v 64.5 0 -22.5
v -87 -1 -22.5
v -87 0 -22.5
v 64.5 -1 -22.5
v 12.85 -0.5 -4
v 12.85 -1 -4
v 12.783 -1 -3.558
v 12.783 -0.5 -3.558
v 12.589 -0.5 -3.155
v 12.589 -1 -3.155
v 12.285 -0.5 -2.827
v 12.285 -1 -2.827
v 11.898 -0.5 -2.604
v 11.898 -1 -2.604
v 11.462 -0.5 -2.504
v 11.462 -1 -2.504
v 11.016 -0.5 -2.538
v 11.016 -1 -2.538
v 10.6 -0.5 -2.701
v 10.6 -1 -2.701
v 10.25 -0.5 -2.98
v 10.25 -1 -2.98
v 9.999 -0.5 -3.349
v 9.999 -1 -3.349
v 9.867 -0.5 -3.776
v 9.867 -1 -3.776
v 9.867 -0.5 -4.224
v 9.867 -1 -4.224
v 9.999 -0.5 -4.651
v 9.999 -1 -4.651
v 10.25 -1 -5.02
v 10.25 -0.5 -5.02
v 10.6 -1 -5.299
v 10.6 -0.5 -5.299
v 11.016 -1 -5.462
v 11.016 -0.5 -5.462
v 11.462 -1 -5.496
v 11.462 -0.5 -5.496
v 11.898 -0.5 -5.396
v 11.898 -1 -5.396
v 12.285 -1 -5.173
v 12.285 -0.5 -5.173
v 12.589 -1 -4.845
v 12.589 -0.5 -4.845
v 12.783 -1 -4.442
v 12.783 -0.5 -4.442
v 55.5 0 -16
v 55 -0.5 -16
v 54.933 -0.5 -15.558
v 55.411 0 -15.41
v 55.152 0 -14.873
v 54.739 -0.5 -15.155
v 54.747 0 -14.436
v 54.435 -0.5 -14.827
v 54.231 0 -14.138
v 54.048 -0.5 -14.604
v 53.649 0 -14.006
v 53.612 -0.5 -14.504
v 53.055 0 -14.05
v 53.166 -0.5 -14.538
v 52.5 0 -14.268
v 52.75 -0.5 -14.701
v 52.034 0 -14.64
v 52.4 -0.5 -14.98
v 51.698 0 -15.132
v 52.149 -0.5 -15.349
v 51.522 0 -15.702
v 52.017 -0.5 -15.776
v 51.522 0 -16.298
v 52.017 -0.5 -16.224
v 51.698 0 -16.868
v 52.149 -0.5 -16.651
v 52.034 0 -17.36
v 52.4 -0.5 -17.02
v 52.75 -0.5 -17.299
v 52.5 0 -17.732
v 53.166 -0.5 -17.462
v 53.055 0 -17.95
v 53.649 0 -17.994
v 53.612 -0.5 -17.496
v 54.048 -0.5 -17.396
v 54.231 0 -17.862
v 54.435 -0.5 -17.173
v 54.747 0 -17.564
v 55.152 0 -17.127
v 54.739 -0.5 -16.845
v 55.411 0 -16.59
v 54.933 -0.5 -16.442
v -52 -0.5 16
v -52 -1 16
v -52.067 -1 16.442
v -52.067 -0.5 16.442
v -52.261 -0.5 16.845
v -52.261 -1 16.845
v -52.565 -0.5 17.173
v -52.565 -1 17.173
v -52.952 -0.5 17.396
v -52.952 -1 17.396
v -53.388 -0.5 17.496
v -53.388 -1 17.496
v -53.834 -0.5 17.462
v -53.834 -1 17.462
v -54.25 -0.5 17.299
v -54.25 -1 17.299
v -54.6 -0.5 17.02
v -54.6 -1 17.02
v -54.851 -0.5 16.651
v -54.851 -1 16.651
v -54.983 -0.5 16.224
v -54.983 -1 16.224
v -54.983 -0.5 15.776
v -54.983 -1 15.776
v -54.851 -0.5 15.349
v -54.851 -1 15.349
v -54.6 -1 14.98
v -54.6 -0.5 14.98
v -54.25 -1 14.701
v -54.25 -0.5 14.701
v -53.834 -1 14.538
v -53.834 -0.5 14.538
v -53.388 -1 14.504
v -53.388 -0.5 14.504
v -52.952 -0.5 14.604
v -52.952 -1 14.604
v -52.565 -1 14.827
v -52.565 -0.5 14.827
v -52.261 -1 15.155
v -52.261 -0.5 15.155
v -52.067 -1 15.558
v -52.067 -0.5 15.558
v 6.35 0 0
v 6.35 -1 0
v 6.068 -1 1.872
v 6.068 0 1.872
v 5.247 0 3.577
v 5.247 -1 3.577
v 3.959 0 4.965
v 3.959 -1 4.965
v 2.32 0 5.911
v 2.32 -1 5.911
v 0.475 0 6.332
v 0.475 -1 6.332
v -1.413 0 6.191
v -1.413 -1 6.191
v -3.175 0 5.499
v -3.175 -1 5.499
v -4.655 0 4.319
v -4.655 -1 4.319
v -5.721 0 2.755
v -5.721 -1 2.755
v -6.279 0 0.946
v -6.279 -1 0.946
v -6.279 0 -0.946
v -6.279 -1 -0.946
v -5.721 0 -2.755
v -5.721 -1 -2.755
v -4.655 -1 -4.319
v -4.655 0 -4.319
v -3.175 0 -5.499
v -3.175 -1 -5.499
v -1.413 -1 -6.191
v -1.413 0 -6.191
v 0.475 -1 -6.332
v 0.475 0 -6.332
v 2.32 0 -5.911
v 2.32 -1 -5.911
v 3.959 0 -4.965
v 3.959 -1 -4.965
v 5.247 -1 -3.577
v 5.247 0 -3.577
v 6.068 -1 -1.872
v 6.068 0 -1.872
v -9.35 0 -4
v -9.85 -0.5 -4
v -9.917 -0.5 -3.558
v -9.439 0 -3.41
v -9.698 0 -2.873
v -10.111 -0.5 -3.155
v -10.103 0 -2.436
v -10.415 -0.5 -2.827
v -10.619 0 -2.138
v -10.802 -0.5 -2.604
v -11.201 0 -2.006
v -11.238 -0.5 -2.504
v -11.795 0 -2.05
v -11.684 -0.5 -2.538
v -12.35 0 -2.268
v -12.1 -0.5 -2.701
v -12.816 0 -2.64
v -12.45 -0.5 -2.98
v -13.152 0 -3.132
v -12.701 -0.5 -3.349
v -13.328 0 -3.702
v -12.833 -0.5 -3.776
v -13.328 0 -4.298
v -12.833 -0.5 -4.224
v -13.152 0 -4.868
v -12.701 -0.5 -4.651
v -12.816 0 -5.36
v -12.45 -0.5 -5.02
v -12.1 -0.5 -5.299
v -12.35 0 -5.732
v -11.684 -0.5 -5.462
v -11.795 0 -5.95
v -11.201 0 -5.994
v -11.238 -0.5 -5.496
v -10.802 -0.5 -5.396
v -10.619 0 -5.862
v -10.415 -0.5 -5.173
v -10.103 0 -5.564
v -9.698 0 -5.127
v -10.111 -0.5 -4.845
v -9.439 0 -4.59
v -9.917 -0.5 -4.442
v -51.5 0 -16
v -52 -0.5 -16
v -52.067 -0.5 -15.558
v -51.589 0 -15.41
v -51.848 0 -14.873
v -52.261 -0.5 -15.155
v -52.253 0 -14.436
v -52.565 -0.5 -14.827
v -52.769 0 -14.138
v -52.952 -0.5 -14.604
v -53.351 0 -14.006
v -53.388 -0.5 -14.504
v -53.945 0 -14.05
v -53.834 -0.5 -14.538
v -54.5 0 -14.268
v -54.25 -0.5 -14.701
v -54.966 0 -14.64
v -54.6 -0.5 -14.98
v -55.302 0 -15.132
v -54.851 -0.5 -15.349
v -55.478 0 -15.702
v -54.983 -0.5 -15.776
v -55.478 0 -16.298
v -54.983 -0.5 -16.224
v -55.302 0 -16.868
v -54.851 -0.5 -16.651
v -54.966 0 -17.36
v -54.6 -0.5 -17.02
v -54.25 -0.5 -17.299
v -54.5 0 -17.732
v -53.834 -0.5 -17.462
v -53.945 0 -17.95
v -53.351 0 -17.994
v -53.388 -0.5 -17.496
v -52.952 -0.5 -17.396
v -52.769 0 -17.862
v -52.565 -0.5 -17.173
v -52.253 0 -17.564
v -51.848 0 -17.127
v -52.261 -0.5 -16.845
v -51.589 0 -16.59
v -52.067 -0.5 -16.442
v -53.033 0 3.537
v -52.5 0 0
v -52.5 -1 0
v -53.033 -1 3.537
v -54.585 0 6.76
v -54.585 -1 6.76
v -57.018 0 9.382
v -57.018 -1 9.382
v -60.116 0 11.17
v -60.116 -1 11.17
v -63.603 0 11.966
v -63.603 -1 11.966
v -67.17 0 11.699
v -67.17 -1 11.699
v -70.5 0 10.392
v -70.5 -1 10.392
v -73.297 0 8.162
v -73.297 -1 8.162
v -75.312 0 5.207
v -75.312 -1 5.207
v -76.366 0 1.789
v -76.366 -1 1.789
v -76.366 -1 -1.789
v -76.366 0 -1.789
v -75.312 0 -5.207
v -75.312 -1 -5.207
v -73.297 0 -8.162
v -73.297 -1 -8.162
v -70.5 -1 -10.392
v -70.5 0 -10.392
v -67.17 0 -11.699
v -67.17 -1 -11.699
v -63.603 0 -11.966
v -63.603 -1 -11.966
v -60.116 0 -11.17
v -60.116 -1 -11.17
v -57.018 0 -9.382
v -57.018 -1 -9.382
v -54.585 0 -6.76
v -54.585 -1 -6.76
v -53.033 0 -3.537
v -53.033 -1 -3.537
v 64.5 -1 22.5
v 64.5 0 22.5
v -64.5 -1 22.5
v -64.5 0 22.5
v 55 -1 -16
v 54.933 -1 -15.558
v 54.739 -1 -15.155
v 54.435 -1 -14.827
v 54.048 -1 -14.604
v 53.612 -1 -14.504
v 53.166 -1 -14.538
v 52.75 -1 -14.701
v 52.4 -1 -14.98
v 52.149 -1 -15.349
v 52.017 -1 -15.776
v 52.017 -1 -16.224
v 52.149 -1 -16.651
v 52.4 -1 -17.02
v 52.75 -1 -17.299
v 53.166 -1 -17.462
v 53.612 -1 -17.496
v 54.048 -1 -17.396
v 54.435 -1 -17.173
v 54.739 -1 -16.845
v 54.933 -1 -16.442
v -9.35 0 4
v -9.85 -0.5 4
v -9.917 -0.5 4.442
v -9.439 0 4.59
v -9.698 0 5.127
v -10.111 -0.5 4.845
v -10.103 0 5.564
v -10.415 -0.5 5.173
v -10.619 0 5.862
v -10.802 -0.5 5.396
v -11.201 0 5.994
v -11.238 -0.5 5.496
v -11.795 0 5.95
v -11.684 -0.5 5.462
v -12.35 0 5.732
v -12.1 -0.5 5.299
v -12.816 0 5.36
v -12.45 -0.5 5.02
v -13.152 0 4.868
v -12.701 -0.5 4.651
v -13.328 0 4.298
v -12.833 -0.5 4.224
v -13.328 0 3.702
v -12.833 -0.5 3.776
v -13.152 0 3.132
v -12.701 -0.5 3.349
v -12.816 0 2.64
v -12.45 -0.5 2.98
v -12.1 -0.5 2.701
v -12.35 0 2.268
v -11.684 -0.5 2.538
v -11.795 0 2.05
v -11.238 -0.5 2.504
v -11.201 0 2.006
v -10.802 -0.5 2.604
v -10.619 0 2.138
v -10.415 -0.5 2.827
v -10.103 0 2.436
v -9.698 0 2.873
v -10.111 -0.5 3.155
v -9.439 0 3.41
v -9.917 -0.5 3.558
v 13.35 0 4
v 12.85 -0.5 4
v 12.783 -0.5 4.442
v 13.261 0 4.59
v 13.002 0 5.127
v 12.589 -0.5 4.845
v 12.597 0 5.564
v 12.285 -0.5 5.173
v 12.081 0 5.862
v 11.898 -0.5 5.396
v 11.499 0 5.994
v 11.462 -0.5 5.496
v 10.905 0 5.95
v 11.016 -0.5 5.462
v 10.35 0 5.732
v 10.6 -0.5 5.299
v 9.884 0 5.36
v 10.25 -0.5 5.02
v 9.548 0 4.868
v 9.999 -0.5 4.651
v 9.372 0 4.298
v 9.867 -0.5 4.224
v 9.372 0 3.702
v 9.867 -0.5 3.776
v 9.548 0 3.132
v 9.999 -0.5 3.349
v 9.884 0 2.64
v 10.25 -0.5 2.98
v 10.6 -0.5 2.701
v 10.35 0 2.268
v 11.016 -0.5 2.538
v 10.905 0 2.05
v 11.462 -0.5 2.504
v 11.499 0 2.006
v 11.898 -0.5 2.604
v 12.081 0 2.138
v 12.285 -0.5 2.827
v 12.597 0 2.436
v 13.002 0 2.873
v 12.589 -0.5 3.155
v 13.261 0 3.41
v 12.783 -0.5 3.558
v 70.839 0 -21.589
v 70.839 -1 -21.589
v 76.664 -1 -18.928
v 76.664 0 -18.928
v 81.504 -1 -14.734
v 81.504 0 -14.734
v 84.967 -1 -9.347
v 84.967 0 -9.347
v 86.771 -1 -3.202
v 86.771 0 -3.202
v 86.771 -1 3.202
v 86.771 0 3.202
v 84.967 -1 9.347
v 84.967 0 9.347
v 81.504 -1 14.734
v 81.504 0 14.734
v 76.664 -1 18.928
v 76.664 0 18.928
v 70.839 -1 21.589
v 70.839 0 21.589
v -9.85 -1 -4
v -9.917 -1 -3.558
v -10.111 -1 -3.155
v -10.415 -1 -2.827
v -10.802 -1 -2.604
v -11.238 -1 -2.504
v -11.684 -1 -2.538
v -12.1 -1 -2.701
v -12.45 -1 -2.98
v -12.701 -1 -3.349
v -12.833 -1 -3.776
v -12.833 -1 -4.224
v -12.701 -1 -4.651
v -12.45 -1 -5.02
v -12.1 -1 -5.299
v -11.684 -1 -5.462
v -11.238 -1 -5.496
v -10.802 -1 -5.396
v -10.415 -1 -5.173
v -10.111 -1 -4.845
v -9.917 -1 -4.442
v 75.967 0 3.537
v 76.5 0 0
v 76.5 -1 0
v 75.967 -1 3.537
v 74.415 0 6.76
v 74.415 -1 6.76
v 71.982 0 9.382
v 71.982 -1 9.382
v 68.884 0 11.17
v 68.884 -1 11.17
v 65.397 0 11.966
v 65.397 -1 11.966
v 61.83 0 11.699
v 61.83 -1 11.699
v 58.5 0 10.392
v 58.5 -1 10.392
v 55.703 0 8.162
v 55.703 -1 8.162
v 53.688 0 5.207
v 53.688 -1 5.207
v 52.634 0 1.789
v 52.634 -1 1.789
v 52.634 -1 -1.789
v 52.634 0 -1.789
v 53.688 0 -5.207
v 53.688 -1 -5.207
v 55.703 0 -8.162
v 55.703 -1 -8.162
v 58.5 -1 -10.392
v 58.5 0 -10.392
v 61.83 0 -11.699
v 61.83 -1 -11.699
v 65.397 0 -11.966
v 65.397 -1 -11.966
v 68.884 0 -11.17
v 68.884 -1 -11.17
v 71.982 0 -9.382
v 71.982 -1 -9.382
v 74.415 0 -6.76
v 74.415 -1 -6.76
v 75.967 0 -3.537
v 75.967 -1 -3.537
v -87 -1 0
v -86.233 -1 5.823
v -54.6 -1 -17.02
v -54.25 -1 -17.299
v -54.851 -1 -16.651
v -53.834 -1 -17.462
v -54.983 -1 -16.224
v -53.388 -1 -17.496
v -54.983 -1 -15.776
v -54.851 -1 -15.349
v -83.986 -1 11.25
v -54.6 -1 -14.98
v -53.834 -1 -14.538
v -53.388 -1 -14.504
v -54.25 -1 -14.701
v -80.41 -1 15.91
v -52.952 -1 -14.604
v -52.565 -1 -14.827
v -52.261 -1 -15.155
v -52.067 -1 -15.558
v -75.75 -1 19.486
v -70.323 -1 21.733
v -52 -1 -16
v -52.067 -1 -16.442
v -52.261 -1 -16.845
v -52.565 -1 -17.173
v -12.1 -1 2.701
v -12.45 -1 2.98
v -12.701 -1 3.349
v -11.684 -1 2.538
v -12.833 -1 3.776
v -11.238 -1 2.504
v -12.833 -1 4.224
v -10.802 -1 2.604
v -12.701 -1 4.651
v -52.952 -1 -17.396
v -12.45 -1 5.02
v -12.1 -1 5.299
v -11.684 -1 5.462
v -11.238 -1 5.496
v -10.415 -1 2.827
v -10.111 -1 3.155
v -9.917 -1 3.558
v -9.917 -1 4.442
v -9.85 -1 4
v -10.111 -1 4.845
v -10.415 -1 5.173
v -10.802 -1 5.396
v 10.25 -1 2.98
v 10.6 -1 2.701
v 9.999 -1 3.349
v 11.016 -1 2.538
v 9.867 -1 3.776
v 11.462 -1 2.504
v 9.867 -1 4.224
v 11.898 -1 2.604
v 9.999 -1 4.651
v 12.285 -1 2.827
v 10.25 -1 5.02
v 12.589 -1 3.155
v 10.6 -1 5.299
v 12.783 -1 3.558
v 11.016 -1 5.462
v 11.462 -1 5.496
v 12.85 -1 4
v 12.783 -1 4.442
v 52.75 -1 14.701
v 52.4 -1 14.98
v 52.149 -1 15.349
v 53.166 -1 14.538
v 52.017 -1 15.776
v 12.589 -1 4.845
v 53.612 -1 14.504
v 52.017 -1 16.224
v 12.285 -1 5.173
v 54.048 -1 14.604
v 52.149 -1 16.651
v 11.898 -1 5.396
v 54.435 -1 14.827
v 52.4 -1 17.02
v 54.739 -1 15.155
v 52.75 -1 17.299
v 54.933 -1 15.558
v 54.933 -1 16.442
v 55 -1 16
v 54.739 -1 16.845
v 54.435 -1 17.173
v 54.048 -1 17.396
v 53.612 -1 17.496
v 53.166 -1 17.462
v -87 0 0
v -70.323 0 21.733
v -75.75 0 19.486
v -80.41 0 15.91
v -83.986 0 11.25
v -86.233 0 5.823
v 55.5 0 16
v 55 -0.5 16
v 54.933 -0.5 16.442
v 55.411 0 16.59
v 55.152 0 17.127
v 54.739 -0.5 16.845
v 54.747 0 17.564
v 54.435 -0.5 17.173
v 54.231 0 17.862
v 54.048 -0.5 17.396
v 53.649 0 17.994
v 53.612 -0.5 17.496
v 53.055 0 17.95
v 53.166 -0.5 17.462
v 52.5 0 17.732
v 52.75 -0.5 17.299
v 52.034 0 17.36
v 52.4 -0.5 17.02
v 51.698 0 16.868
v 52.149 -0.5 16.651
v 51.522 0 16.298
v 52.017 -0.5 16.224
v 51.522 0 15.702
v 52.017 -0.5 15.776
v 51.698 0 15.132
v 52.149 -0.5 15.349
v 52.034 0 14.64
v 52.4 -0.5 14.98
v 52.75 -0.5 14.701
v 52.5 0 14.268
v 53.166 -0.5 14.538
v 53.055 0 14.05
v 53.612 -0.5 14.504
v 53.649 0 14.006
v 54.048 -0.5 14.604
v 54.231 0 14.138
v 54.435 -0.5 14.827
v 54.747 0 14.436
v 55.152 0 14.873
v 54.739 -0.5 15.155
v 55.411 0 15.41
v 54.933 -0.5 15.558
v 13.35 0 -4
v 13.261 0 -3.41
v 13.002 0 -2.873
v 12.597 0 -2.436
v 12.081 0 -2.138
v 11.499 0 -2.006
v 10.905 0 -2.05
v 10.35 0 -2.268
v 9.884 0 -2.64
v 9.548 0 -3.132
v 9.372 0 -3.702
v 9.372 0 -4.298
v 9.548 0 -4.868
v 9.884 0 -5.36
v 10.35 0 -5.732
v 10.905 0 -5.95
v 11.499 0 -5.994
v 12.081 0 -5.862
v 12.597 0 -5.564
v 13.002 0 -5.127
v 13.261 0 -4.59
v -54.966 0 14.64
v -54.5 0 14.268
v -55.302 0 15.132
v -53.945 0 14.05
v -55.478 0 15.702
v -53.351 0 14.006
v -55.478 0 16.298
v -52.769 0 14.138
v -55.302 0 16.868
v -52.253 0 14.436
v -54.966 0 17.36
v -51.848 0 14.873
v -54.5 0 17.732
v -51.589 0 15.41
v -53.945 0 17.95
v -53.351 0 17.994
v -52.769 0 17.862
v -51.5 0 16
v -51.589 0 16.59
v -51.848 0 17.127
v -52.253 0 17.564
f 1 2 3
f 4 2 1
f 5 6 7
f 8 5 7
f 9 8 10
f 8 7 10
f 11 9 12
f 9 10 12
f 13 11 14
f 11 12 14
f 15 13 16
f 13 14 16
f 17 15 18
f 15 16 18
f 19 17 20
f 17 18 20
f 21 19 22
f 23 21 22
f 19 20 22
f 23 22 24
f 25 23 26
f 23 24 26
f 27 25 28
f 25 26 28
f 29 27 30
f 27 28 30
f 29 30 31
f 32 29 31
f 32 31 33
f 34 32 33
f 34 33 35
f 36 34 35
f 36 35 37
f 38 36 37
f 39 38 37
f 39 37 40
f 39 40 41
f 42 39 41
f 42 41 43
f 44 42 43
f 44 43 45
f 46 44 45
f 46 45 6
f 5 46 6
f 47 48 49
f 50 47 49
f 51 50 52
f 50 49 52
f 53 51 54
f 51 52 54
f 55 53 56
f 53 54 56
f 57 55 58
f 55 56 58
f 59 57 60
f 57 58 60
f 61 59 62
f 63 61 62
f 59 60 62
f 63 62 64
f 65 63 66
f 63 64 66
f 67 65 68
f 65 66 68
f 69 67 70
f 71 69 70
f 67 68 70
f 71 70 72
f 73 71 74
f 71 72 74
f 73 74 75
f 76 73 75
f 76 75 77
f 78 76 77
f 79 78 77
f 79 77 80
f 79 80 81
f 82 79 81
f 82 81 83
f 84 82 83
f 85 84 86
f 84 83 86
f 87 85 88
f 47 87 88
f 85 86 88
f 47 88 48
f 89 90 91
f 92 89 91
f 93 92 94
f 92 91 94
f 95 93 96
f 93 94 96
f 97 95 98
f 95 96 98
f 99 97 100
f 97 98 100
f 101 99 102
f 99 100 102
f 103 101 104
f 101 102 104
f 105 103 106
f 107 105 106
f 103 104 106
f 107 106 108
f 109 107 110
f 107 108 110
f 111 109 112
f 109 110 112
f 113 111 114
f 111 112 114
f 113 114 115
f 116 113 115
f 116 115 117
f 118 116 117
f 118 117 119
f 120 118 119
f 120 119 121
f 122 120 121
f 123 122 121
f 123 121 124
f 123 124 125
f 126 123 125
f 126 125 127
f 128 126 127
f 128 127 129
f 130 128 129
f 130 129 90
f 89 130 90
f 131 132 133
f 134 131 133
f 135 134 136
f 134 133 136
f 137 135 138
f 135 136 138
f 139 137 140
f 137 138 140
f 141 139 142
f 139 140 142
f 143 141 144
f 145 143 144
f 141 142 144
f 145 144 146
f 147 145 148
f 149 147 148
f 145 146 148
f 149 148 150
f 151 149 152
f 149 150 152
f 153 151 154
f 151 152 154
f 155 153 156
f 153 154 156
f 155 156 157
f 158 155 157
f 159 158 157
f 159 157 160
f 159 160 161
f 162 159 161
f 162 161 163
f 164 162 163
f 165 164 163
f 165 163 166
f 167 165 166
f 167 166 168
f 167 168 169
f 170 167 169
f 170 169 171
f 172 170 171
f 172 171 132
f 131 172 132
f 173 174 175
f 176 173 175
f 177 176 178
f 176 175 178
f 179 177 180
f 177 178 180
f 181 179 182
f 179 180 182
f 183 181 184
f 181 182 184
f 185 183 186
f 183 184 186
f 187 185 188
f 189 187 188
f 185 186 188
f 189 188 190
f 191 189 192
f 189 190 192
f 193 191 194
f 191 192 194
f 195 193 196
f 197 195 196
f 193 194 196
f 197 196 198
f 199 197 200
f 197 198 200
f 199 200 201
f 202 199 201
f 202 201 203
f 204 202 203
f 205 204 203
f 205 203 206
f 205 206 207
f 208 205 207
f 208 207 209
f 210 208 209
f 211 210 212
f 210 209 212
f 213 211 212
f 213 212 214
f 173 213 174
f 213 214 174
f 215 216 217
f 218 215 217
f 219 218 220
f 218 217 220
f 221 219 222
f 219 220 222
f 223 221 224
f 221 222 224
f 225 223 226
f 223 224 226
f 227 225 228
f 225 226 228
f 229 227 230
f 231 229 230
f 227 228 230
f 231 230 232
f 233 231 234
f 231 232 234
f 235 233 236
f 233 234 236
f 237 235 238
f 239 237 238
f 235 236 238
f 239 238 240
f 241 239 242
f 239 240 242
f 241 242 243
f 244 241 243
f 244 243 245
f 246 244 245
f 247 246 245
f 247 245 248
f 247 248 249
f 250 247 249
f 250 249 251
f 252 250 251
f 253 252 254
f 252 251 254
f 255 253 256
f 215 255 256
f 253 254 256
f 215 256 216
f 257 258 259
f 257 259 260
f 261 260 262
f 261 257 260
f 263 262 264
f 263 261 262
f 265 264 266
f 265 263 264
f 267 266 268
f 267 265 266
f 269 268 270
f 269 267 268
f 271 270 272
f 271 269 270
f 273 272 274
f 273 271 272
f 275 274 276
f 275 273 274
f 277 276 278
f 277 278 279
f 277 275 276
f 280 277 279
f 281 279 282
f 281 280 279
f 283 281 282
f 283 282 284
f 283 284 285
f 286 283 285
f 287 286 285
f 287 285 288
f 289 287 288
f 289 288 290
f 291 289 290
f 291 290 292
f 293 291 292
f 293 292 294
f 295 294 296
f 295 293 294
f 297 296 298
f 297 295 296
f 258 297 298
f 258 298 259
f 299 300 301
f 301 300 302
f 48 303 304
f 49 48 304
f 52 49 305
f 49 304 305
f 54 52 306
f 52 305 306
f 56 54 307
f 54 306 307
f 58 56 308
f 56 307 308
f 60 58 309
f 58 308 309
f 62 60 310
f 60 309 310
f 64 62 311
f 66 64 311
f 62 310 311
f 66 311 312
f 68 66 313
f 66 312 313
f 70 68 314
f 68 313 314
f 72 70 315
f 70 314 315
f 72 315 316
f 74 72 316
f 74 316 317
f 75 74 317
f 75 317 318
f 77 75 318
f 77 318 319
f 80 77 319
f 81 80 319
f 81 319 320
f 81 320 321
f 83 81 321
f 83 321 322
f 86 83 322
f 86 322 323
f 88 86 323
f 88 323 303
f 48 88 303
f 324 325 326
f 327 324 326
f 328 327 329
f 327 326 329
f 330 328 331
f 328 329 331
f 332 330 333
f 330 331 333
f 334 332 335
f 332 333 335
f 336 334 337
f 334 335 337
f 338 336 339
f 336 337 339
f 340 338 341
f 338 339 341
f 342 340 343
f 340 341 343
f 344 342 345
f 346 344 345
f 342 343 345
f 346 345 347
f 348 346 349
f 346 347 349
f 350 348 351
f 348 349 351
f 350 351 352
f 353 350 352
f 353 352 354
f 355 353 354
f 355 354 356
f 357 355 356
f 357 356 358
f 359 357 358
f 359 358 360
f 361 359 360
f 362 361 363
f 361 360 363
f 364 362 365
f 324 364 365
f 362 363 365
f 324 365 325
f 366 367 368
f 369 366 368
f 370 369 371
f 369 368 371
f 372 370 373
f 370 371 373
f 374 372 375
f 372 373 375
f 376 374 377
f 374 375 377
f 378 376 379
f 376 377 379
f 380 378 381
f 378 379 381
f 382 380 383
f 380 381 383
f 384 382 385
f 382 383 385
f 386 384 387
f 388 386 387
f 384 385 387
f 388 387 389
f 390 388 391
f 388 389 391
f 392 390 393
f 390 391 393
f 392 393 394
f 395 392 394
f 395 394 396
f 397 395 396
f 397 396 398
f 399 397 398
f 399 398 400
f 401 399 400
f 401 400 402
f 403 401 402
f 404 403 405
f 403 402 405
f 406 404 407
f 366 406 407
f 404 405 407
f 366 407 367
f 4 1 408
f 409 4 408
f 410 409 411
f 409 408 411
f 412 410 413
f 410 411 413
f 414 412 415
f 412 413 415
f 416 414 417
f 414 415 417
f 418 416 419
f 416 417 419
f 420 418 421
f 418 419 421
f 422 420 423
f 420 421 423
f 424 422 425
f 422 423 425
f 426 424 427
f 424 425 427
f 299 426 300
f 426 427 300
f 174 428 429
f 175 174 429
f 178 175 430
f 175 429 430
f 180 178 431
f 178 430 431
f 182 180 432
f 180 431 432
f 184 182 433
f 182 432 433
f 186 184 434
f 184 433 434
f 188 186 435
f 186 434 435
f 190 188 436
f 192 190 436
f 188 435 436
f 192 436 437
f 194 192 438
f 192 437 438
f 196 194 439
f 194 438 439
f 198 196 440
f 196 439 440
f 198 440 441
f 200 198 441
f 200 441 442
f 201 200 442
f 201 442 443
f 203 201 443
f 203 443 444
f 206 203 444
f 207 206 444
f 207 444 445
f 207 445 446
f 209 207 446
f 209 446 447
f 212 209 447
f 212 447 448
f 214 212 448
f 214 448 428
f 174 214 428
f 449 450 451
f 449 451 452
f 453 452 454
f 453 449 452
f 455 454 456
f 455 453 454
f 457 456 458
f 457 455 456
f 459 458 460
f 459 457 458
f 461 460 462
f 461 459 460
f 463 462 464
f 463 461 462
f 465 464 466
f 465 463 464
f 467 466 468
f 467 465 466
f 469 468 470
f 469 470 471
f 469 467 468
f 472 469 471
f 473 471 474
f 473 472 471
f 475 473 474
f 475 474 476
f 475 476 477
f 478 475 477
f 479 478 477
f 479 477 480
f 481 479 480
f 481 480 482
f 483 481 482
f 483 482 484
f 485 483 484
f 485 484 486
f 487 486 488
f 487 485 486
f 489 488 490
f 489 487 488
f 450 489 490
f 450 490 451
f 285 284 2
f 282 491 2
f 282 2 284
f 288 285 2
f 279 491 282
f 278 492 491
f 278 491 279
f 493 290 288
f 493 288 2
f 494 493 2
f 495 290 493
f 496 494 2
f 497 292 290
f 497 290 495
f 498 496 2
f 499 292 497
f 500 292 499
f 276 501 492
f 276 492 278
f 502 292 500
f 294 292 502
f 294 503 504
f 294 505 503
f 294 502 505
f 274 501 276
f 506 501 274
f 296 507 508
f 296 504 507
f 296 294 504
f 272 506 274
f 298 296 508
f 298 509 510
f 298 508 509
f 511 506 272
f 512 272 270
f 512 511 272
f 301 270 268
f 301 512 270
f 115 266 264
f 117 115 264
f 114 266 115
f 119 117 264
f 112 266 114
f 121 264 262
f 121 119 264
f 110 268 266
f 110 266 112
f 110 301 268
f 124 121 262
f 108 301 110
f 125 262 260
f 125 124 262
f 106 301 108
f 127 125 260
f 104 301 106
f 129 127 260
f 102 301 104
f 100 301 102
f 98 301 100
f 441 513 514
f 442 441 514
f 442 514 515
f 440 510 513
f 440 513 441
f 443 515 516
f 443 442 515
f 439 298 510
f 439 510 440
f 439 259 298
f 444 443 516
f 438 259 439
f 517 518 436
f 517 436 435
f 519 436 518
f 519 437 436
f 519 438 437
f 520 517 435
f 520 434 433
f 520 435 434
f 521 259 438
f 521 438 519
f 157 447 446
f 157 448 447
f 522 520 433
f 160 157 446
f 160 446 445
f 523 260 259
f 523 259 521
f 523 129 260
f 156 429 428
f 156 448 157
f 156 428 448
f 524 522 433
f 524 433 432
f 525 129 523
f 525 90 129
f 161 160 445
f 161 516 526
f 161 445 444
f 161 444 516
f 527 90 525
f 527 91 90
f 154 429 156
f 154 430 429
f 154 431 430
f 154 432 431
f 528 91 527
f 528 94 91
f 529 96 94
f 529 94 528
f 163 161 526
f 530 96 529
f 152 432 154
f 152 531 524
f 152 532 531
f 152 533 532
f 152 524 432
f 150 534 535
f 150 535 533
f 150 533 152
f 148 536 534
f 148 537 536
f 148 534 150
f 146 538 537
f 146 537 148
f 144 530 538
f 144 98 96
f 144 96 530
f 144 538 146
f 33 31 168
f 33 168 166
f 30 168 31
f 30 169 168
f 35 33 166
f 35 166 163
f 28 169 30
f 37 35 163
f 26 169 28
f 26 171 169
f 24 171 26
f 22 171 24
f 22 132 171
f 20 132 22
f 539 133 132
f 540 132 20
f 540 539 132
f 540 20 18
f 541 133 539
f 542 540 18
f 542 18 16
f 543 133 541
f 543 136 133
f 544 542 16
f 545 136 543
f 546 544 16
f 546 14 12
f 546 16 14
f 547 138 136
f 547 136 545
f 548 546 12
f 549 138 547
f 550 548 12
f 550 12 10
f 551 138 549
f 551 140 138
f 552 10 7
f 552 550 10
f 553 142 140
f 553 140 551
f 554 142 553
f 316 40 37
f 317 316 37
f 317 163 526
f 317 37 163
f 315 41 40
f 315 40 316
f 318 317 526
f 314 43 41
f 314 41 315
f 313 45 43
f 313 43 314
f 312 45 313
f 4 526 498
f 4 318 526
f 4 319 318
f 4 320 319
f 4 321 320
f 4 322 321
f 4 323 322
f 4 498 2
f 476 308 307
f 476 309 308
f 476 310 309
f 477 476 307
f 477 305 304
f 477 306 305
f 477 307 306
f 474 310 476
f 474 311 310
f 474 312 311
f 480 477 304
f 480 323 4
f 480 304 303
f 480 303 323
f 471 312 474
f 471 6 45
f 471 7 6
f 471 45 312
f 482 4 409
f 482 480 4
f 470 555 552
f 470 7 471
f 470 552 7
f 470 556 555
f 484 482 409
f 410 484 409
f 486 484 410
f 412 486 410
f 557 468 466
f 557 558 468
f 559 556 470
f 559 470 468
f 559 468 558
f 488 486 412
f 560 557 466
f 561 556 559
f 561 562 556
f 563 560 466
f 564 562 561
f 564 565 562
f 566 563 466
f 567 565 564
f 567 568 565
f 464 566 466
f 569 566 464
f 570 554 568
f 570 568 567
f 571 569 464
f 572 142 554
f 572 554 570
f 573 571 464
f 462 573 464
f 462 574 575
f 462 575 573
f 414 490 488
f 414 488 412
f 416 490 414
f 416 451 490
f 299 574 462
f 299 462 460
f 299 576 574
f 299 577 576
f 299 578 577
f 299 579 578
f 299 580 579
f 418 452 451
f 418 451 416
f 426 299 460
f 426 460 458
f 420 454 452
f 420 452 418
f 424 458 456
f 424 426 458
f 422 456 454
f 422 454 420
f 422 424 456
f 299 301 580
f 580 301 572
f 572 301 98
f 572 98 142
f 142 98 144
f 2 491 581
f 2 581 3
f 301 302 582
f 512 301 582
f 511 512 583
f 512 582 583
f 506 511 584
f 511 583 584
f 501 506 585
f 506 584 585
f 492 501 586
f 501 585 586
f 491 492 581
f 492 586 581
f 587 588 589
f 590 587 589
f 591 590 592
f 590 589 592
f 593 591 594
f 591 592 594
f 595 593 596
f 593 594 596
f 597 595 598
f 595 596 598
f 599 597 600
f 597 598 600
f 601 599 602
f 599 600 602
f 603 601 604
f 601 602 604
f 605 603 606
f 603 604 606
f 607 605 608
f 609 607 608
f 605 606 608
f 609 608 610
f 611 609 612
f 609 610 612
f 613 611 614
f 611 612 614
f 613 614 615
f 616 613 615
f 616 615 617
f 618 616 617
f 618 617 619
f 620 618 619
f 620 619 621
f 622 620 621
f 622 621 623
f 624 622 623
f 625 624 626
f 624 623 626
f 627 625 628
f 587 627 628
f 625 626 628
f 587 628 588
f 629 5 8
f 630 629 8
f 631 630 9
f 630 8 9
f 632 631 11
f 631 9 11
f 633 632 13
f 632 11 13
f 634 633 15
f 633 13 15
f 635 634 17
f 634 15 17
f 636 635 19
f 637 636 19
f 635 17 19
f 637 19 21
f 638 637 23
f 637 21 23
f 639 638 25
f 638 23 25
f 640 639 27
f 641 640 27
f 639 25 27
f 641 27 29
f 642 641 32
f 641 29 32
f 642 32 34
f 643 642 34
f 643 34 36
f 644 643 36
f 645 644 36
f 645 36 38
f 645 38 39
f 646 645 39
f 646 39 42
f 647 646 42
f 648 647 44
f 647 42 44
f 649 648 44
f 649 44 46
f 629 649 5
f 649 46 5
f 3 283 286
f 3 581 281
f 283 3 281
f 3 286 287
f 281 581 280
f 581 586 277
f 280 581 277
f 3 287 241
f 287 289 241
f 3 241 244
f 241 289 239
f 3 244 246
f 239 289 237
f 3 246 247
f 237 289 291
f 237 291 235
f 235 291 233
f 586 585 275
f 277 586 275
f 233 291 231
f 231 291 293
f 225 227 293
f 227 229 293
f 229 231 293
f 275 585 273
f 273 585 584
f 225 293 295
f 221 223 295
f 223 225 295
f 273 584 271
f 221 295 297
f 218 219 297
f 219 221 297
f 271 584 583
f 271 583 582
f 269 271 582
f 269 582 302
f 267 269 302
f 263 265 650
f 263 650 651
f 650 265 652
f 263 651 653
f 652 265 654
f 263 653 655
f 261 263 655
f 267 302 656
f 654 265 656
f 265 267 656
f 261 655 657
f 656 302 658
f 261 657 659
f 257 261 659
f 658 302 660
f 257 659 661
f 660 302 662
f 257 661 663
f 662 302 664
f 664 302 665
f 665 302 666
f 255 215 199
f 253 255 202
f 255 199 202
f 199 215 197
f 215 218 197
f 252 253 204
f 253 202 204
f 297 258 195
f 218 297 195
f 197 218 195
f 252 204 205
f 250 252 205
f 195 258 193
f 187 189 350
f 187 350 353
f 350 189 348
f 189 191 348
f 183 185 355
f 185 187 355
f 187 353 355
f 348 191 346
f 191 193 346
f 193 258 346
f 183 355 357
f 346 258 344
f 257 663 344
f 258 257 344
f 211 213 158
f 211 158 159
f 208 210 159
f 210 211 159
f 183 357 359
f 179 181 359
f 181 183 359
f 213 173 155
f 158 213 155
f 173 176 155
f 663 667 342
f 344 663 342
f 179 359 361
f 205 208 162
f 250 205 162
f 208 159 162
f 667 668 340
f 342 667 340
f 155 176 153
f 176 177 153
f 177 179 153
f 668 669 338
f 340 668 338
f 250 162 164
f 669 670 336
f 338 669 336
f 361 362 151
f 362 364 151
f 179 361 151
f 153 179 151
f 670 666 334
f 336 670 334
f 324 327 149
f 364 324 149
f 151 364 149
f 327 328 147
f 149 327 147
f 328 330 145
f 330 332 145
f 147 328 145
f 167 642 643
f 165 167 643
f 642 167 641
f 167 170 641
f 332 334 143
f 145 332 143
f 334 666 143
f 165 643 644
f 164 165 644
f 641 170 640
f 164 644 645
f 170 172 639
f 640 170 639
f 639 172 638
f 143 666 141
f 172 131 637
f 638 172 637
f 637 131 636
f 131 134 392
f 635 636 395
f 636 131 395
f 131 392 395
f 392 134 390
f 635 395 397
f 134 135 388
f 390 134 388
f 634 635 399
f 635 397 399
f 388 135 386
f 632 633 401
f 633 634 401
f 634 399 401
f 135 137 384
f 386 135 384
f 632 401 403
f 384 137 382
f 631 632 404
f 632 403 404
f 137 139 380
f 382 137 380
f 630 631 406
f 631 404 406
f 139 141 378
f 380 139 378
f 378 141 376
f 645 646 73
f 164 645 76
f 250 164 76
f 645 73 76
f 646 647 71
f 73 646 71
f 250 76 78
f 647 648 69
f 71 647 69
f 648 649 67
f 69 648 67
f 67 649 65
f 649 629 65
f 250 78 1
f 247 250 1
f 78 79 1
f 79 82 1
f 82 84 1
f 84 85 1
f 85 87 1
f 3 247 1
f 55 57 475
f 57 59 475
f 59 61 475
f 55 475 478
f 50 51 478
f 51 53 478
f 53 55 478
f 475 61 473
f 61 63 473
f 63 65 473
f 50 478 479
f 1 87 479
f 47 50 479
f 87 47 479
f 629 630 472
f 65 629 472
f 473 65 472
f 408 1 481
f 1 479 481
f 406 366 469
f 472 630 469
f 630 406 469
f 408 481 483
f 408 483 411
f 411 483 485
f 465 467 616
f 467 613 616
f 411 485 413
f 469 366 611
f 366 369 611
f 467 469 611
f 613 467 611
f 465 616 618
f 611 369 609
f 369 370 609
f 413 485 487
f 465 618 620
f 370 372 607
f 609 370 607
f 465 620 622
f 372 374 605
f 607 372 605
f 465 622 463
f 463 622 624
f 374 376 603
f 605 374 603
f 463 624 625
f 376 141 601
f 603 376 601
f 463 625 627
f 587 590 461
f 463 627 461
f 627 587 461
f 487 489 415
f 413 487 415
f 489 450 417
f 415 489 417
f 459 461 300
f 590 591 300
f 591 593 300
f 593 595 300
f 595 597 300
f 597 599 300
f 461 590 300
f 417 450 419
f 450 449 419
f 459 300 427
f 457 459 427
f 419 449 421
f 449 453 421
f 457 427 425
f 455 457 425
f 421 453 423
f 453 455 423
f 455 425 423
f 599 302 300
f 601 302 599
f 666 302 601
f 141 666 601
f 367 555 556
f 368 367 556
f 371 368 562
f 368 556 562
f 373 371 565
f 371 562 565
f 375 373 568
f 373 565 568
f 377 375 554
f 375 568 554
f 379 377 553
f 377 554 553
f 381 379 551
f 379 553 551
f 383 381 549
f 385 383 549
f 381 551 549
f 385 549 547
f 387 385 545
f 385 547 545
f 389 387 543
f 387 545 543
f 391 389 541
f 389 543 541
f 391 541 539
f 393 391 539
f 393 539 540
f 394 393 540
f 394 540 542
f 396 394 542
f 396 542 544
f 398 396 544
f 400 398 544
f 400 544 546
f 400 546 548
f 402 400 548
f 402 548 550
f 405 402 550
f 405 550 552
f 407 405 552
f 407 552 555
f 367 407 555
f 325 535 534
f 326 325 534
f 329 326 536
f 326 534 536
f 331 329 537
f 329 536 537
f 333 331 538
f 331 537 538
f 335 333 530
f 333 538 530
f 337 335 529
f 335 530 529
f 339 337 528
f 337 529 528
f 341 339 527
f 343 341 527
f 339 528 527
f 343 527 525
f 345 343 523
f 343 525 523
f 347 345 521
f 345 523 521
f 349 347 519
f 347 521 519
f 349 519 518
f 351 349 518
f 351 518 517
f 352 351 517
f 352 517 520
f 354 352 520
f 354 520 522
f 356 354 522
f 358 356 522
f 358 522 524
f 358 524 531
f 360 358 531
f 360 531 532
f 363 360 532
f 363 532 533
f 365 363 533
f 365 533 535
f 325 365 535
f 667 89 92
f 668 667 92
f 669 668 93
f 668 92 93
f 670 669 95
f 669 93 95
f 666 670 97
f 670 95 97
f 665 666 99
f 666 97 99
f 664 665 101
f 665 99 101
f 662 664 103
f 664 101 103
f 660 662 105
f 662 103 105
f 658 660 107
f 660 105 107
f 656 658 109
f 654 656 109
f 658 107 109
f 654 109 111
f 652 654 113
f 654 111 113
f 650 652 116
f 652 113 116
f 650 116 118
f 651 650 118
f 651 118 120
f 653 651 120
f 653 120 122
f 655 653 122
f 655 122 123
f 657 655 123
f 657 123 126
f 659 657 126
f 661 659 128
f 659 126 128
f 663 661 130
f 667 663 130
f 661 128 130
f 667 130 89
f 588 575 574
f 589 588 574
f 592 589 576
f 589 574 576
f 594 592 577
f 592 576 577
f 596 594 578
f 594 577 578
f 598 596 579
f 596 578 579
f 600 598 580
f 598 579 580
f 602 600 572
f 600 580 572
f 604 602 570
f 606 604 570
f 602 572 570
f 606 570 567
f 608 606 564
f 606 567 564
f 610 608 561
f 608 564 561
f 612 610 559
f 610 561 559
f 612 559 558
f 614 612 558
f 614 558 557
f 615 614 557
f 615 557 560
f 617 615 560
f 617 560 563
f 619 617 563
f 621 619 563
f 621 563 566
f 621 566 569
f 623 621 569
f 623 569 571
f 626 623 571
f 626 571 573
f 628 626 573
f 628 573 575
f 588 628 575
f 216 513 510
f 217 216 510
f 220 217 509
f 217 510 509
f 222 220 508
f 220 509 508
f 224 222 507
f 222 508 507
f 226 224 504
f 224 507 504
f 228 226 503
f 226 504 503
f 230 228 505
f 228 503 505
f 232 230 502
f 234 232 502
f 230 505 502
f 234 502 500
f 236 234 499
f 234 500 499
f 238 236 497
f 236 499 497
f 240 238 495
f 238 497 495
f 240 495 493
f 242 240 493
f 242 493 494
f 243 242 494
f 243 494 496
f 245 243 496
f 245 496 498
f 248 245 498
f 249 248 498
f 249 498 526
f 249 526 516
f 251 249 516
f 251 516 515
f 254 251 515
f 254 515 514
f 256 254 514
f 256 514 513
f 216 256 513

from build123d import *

# Parameters (mm, degrees)
F0_R      = 12
F1_DEPTH  = 1
F3_DEPTH  = 1
F4_R      = 1.5
F5_DEPTH  = 25
F6_SIZE   = 0.5
F7_R      = 6.35
F8_DEPTH  = 25
F9_R      = 1.5
F10_DEPTH = 25
F11_SIZE  = 0.5


with BuildPart() as f1:
    # F0 (on Front) → F1 (new body)
    with BuildSketch(Plane.XZ):
        with BuildLine():
            ThreePointArc((64.5, -22.5), (87, 0), (64.5, 22.5))
            Line((64.5, 22.5), (-64.5, 22.5))
            ThreePointArc((-64.5, 22.5), (-87, 0), (-64.5, -22.5))
            Line((-64.5, -22.5), (64.5, -22.5))
        make_face()
        with Locations((-64.5, 0)):
            Circle(F0_R, mode=Mode.SUBTRACT)
        with Locations((64.5, 0)):
            Circle(F0_R, mode=Mode.SUBTRACT)
    extrude(amount=F1_DEPTH)

    # F2 (on face) → F3 (join)
    with BuildSketch(Plane.XZ.offset(1)):
        Polygon((-87, -22.5), (-64.5, -22.5), (-64.5, -17.4313578755), (-70.5482587218, -14.7617282346), (-78.2682448626, -9.4630774111), (-80.8771923184, 0), (-87, 0), align=None)
    extrude(amount=-F3_DEPTH)

    # F4 (on face) → F5 (cut)
    with BuildSketch(Plane.XZ.offset(1)):
        with Locations((-53.5, 16)):
            Circle(F4_R)
        with Locations((-53.5, -16)):
            Circle(F4_R)
        with Locations((53.5, 16)):
            Circle(F4_R)
        with Locations((53.5, -16)):
            Circle(F4_R)
    extrude(amount=-F5_DEPTH, mode=Mode.SUBTRACT)

    # F6
    f6_edges = [f1.edges().sort_by_distance(p)[0] for p in [
        (-55, 0, 16),
        (-55, 0, -16),
        (52, 0, 16),
        (52, 0, -16),
    ]]
    chamfer(f6_edges, length=F6_SIZE)

    # F7 (on face) → F8 (cut)
    with BuildSketch(Plane.XZ.offset(1)):
        Circle(F7_R)
    extrude(amount=-F8_DEPTH, mode=Mode.SUBTRACT)

    # F9 (on face) → F10 (cut)
    with BuildSketch(Plane.XZ.offset(1)):
        with Locations((-11.35, 4)):
            Circle(F9_R)
        with Locations((-11.35, -4)):
            Circle(F9_R)
        with Locations((11.35, 4)):
            Circle(F9_R)
        with Locations((11.35, -4)):
            Circle(F9_R)
    extrude(amount=-F10_DEPTH, mode=Mode.SUBTRACT)

    # F11
    f11_edges = [f1.edges().sort_by_distance(p)[0] for p in [
        (-12.85, 0, 4),
        (-12.85, 0, -4),
        (9.85, 0, -4),
        (9.85, 0, 4),
    ]]
    chamfer(f11_edges, length=F11_SIZE)


solid = f1.part
